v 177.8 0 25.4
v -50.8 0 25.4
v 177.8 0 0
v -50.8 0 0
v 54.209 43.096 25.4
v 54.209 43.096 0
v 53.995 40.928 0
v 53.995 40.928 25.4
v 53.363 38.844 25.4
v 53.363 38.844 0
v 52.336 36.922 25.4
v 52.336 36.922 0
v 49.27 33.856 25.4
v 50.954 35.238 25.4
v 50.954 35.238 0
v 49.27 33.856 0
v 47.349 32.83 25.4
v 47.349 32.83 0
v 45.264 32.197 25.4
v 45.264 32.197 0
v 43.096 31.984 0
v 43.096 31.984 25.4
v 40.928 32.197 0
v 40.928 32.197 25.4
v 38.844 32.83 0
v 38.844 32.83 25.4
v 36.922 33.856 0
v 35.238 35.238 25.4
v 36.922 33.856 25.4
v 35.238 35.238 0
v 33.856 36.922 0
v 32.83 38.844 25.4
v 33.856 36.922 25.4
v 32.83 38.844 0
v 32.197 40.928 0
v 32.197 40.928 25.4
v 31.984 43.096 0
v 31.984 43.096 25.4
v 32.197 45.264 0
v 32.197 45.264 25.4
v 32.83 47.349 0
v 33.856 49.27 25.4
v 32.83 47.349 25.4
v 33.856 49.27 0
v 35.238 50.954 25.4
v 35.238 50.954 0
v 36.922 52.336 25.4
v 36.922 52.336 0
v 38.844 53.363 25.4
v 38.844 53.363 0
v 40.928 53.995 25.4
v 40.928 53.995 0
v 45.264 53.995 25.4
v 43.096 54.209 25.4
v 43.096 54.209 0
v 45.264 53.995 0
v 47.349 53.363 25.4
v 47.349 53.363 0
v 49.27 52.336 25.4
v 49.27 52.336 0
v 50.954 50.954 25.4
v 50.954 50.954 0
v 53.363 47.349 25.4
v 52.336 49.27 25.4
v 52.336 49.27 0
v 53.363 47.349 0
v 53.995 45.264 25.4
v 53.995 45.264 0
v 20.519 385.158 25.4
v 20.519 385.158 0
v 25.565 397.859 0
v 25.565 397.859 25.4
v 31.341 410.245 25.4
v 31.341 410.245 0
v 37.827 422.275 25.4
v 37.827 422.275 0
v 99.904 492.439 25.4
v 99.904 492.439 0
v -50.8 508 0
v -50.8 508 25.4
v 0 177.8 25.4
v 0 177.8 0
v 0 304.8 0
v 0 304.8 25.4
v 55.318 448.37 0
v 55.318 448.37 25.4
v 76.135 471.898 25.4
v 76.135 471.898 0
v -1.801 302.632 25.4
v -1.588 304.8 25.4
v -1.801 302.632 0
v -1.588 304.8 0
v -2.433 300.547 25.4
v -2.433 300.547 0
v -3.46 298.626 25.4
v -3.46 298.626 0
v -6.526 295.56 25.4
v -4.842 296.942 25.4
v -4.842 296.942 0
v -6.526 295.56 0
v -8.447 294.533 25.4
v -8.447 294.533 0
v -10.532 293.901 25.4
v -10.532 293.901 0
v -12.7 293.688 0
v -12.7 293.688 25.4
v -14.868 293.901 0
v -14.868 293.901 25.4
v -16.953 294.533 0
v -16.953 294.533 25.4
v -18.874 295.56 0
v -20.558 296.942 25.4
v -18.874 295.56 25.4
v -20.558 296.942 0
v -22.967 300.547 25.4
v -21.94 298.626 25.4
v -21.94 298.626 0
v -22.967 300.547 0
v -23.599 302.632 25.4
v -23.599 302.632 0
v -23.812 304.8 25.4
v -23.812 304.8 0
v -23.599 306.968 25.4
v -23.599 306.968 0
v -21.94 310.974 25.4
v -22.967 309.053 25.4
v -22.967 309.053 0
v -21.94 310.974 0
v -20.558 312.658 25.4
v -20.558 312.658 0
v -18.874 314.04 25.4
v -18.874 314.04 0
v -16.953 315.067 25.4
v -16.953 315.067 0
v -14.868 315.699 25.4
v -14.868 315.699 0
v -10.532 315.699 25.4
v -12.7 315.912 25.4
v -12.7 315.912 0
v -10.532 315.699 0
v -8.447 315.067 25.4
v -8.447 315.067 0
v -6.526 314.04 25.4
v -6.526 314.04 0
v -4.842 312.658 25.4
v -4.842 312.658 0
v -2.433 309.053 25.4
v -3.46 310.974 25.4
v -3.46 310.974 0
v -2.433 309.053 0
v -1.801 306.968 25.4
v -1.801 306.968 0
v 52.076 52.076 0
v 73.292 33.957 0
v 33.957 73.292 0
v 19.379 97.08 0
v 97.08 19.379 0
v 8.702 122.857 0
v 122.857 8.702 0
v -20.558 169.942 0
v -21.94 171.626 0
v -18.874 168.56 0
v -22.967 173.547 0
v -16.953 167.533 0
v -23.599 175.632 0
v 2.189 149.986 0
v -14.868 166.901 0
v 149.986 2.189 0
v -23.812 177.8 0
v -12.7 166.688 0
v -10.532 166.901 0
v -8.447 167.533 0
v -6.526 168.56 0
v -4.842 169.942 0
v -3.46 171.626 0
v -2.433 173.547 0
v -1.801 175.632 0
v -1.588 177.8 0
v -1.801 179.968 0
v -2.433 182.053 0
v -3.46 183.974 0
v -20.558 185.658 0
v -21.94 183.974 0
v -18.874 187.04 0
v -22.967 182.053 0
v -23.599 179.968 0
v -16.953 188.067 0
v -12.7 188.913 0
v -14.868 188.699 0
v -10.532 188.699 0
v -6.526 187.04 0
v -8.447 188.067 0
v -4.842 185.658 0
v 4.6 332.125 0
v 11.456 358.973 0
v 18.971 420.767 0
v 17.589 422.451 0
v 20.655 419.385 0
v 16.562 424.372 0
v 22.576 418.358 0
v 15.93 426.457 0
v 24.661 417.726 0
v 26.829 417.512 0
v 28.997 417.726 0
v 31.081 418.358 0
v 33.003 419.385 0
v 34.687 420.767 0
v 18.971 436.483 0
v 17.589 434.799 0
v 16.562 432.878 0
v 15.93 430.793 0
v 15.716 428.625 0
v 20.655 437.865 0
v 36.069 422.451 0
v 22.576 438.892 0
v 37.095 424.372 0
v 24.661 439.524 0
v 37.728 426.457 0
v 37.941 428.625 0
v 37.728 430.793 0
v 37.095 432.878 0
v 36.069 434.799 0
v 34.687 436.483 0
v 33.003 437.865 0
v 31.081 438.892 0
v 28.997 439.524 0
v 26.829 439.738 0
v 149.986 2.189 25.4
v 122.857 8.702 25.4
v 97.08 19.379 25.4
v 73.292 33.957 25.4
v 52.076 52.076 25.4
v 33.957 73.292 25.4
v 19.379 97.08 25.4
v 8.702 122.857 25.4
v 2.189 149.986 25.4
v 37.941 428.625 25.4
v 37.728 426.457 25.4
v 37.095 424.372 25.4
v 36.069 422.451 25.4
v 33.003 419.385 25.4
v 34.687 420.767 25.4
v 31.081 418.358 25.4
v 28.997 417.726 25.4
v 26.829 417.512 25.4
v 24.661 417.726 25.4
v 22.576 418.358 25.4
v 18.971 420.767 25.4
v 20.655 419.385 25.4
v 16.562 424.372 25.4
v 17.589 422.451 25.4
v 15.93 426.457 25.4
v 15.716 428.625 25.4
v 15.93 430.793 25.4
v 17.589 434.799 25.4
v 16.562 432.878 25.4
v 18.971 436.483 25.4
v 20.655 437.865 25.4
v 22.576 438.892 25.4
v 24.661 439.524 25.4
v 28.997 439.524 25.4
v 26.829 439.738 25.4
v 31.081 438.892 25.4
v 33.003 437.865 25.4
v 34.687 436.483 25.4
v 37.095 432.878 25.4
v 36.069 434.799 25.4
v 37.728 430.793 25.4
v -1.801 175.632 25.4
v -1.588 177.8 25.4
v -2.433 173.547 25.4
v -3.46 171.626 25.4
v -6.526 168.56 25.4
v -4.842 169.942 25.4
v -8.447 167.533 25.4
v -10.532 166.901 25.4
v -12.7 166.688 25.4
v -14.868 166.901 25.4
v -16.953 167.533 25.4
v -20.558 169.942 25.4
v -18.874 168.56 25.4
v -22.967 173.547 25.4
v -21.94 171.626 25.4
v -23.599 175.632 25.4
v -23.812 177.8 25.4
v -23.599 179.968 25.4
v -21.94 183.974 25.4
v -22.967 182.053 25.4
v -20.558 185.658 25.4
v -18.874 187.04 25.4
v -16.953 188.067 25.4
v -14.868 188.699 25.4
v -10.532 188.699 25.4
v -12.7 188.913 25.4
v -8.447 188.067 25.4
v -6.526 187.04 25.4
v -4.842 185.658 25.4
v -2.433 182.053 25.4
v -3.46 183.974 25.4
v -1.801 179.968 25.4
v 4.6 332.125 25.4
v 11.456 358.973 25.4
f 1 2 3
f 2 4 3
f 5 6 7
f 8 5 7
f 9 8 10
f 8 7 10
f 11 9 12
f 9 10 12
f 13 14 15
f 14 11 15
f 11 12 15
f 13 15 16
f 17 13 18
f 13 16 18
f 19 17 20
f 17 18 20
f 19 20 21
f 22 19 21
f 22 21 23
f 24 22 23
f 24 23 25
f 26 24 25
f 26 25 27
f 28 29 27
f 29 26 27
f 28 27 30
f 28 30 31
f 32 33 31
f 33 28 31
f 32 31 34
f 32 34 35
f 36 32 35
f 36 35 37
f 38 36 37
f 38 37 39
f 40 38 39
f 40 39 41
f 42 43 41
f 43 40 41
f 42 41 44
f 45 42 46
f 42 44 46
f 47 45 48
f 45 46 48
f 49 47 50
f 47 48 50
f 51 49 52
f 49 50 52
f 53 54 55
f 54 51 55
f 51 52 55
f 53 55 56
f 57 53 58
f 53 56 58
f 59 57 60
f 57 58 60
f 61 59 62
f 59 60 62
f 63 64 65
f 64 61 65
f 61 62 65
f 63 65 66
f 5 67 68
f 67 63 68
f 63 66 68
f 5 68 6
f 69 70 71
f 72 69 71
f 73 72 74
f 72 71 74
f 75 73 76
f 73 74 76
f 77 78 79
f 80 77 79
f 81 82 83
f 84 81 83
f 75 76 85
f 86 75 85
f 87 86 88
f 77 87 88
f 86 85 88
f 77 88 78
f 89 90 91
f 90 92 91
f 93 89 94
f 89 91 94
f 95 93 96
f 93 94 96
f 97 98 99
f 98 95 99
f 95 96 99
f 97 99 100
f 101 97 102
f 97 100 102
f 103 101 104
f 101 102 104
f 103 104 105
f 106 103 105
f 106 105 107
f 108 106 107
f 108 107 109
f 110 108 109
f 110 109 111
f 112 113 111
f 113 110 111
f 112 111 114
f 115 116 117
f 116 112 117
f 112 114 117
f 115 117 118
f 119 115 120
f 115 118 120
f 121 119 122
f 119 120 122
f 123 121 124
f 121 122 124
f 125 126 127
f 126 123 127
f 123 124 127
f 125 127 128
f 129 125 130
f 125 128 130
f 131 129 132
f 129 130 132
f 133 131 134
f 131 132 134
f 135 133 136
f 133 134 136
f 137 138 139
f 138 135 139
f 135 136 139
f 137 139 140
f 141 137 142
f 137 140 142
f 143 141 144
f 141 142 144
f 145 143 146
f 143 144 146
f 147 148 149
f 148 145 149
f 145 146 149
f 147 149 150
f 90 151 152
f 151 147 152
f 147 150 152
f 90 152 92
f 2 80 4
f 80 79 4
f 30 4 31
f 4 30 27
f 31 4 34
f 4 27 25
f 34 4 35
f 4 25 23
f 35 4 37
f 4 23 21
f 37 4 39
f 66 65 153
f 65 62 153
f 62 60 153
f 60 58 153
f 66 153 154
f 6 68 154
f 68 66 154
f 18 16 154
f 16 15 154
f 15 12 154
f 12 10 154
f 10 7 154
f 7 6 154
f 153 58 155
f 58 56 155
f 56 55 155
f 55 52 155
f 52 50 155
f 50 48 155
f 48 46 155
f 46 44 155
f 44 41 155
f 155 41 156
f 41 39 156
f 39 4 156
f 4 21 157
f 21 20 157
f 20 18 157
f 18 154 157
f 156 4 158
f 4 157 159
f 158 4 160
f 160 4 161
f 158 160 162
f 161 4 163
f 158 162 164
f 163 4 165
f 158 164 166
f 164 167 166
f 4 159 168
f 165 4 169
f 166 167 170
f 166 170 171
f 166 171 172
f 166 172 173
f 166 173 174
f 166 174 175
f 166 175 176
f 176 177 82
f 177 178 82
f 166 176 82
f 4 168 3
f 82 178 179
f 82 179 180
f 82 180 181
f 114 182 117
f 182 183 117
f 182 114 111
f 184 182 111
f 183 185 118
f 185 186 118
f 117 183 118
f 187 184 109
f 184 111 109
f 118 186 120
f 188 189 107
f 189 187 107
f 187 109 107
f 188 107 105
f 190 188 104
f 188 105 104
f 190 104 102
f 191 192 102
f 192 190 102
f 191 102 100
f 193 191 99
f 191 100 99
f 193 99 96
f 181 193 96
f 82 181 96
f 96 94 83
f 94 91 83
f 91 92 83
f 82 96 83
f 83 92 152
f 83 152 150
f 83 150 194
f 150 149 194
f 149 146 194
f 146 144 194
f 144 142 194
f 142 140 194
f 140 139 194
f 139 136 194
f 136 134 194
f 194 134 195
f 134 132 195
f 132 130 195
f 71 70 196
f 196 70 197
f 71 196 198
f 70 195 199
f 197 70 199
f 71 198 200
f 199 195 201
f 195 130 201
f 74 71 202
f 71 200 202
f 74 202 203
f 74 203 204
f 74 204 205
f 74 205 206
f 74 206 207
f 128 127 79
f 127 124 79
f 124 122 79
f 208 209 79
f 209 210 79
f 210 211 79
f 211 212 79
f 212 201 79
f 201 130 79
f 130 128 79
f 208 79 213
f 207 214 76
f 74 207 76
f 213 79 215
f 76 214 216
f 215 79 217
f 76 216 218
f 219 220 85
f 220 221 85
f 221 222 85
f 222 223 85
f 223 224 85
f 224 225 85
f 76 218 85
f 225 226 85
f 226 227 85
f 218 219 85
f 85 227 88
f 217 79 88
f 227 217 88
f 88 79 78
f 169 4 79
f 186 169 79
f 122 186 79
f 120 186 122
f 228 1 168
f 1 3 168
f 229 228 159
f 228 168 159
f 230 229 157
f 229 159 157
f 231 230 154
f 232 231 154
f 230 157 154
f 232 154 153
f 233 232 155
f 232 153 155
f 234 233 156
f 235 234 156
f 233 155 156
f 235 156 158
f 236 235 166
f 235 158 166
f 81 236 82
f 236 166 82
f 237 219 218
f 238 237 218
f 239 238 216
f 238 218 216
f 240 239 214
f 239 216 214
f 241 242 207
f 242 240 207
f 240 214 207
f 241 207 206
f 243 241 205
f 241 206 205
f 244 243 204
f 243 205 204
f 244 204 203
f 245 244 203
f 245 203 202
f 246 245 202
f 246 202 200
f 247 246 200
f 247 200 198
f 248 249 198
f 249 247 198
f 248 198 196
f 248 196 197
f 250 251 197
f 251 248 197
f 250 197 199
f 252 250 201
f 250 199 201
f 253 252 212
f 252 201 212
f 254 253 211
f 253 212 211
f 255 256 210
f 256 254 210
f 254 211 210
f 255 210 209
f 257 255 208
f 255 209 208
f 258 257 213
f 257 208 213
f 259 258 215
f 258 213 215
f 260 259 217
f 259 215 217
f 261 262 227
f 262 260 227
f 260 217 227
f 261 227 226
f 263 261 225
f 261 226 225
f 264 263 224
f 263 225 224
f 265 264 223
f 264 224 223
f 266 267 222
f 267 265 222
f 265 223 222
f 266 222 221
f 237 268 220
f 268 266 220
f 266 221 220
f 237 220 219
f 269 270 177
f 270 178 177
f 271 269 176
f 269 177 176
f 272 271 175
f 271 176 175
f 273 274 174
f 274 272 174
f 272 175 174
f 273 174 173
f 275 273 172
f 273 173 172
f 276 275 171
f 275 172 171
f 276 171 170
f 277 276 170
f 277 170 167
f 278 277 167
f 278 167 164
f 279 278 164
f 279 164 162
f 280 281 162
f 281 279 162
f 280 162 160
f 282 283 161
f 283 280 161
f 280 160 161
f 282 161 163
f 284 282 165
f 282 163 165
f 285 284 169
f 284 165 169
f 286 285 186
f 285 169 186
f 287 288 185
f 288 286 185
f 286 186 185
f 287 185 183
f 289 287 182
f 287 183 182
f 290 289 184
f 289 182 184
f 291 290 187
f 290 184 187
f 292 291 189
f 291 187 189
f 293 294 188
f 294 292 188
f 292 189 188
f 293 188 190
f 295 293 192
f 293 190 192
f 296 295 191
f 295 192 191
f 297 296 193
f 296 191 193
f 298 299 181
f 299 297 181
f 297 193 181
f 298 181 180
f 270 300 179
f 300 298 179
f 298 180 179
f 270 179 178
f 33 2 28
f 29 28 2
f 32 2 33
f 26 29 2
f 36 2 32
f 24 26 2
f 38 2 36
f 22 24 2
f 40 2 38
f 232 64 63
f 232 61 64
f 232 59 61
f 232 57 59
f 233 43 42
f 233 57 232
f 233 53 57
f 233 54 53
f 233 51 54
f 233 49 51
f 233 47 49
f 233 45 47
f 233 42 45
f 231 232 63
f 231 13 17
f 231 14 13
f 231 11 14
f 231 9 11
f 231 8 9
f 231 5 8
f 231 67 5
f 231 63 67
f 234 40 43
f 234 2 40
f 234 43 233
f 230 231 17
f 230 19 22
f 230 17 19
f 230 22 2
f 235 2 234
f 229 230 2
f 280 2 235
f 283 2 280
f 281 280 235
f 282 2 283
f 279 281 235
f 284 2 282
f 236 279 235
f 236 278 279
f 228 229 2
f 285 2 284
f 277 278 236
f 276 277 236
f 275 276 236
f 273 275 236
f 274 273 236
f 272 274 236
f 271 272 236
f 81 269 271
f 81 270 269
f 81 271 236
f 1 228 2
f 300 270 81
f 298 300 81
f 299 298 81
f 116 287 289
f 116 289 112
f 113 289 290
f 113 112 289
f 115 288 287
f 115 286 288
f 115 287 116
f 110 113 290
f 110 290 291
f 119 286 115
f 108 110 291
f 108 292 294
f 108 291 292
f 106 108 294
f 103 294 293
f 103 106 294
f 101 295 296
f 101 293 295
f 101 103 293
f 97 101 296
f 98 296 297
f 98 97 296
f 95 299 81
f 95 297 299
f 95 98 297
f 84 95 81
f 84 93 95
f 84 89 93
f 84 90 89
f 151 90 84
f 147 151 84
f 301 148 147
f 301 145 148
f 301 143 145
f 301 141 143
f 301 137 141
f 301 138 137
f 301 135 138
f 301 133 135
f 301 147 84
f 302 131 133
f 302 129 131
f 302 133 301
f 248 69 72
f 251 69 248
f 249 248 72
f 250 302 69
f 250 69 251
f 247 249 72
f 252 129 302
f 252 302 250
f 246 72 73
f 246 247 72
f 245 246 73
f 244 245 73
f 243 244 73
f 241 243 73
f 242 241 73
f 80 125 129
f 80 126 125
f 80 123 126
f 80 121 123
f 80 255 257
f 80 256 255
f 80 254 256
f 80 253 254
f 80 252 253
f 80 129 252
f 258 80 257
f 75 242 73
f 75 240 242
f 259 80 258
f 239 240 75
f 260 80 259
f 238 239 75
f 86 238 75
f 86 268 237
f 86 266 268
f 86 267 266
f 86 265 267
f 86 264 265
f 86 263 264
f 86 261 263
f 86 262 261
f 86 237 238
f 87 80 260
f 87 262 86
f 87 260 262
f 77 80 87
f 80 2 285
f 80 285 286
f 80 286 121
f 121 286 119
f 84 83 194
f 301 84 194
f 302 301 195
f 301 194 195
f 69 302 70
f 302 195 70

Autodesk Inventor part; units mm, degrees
ref_plane "YZ Plane" through (0, 0, 0) normal (1, 0, 0) x (0, 1, 0)
ref_plane "XZ Plane" through (0, 0, 0) normal (0, 1, 0) x (-1, 0, 0)
ref_plane "XY Plane" through (0, 0, 0) normal (0, 0, 1) x (1, 0, 0)
sketch "Sketch1" plane through (0, 0, 0) normal (0, 0, 1) x (1, 0, 0)
  line L0 (0, 0) -> (609.6, 0) construction
  line L1 (609.6, 0) -> (609.6, 209.55)
  line L2 (609.6, 209.55) -> (0, 209.55) construction
  line L3 (0, 209.55) -> (0, 0) construction
  line L4 (0, 0) -> (304.8, 0) construction
  line L5 (304.8, 0) -> (304.8, 165.1) construction
  line L6 (304.8, 165.1) -> (0, 165.1) construction
  line L7 (0, 165.1) -> (0, 0) construction
  line L8 (0, 0) -> (165.1, 0) construction
  line L9 (165.1, 0) -> (165.1, 304.8) construction
  line L10 (165.1, 304.8) -> (0, 304.8) construction
  line L11 (0, 304.8) -> (0, 0) construction
  line L12 (0, 0) -> (177.8, 0) construction
  line L13 (177.8, 0) -> (177.8, 177.8) construction
  line L14 (177.8, 177.8) -> (0, 177.8) construction
  line L15 (0, 177.8) -> (0, 0) construction
  circle A0 centre (177.8, 177.8) radius 12.7
  line L16 (177.8, 177.8) -> (165.1, 177.8)
  line L17 (177.8, 177.8) -> (177.8, 165.1)
  line L18 (177.8, 177.8) -> (168.819744, 168.819744)
  line L19 (177.8, 177.8) -> (190.5, 177.8) construction
  line L20 (168.819744, 168.819744) -> (52.076414, 52.076414) construction
  line L21 (168.819744, 168.819744) -> (333.919744, 168.819744) construction
  line L22 (177.8, 165.1) -> (177.8, 0) construction
  line L23 (165.1, 177.8) -> (0, 177.8) construction
  arc A1 (0, 177.8) -> (177.8, 0) centre (177.8, 177.8) ccw
  line L24 (177.8, 177.8) -> (304.8, 177.8) construction
  line L25 (304.8, 177.8) -> (304.8, 193.675)
  line L26 (304.8, 193.675) -> (177.8, 193.675) construction
  line L27 (177.8, 193.675) -> (177.8, 177.8) construction
  circle A2 centre (304.8, 193.675) radius 12.7
  line L28 (304.8, 193.675) -> (431.8, 193.675) construction
  line L29 (431.8, 193.675) -> (431.8, 209.55) construction
  line L30 (431.8, 209.55) -> (304.8, 209.55) construction
  line L31 (304.8, 209.55) -> (304.8, 193.675) construction
  circle A3 centre (431.8, 209.55) radius 12.7
  line L32 (177.8, 0) -> (609.6, 0)
  line L33 (177.8, 165.1) -> (304.8, 180.975)
  line L34 (431.8, 196.85) -> (304.8, 180.975)
  line L35 (431.8, 196.85) -> (609.6, 209.55)
  line L36 (165.1, 177.8) -> (165.1, 304.8) construction
  line L37 (165.1, 304.8) -> (241.3, 304.8) construction
  circle A4 centre (241.3, 304.8) radius 76.2
  circle A5 centre (177.8, 228.6) radius 12.7
  line L38 (177.8, 177.8) -> (177.8, 228.6)
  line L39 (0, 177.8) -> (0, 304.8)
  line L40 (241.3, 304.8) -> (195.441695, 365.656026) construction
  line L41 (241.3, 304.8) -> (317.5, 304.8) construction
  line L42 (195.441695, 365.656026) -> (354.191695, 365.656026) construction
  line L43 (195.441695, 365.656026) -> (99.90356, 492.439413) construction
  line L44 (195.441695, 365.656026) -> (354.191695, 365.656026) construction
  line L45 (165.1, 304.8) -> (0, 304.8) construction
  line L46 (241.3, 304.8) -> (169.695422, 330.861935) construction
  line L47 (241.3, 304.8) -> (317.5, 304.8) construction
  line L48 (169.695422, 330.861935) -> (20.519219, 385.157633) construction
  line L49 (177.8, 0) -> (408.09644, 0) construction
  line L50 (241.3, 304.8) -> (317.5, 304.8) construction
  line L51 (241.3, 304.8) -> (175.308864, 342.9) construction
  line L52 (241.3, 304.8) -> (317.5, 304.8) construction
  line L53 (175.308864, 342.9) -> (37.827331, 422.275) construction
  arc A6 (99.90356, 492.439413) -> (20.519219, 385.157633) centre (241.3, 304.8) ccw
  arc A7 (37.827331, 422.275) -> (0, 304.8) centre (330.4977, 263.206429) ccw
  line L54 (37.827331, 422.275) -> (26.828809, 428.625) construction
  circle A8 centre (26.828809, 428.625) radius 12.7
  line L55 (0, 304.8) -> (-12.7, 304.8) construction
  circle A9 centre (-12.7, 304.8) radius 12.7
  line L56 (0, 177.8) -> (-12.7, 177.8) construction
  circle A10 centre (-12.7, 177.8) radius 12.7
  line L57 (52.076414, 52.076414) -> (43.096158, 43.096158) construction
  circle A11 centre (43.096158, 43.096158) radius 12.7
  line L58 (0, 177.8) -> (0, 304.8)
  circle A12 centre (43.096158, 43.096158) radius 11.1125
  circle A13 centre (-12.7, 304.8) radius 11.1125
  circle A14 centre (-12.7, 177.8) radius 11.1125
  circle A15 centre (26.828809, 428.625) radius 11.1125
  line L59 (190.5, 177.8) -> (393.7, 177.8) construction
  line L60 (609.6, 0) -> (-50.8, 0)
  line L61 (-50.8, 0) -> (-50.8, 508)
  line L62 (-50.8, 508) -> (99.90356, 492.439413)
  line L63 (177.8, 0) -> (-50.8, 0)
  point P0 (165.275068, 230.701449)
  point P1 (172.715134, 216.962383)
  dimension "d16" = 25.4
  dimension "d19" = 25.4
  dimension "d0" = 609.6
  dimension "d1" = 209.55
  dimension "d2" = 304.8
  dimension "d3" = 165.1
  dimension "d4" = 165.1
  dimension "d5" = 304.8
  dimension "d6" = 177.8
  dimension "d7" = 177.8
  dimension "d8" = 25.4
  dimension "d9" = 12.7
  dimension "d10" = 135
  dimension "d11" = 165.1
  dimension "d12" = 135
  dimension "d13" = 165.1
  dimension "d14" = 127
  dimension "d15" = 15.875
  dimension "d17" = 127
  dimension "d18" = 15.875
  dimension "d20" = 127
  dimension "d21" = 76.2
  dimension "d22" = 152.4
  dimension "d23" = 25.4
  dimension "d24" = 50.8
  dimension "d25" = 127
  dimension "d26" = 127
  dimension "d33" = 158.75
  dimension "d34" = 127
  dimension "d35" = 160
  dimension "d36" = 158.75
  dimension "d37" = 180
  dimension "d45" = 150
  dimension "d46" = 158.75
  dimension "d47" = 180
  dimension "d48" = 12.7
  dimension "d49" = 12.7
  dimension "d50" = 12.7
  dimension "d52" = 12.7
  dimension "d53" = 25.4
  dimension "d55" = 214.47119
  dimension "d56" = 22.225
  dimension "d57" = 22.225
  dimension "d58" = 22.225
  dimension "d59" = 22.225
  dimension "d60" = 134.70384
  dimension "d72" = 660.4
  dimension "d73" = 508
  dimension "d74" = 90
sketch "Sketch1 outline for Extrusion2" plane through (0, 0, 0) normal (0, 0, 1) x (1, 0, 0)
  line L0 (-50.8, 508) -> (-50.8, 0)
  line L1 (99.90356, 492.439413) -> (-50.8, 508)
  line L2 (-50.8, 0) -> (177.8, 0)
  arc A0 (37.827331, 422.275) -> (99.90356, 492.439413) centre (241.3, 304.8) cw
  arc A1 (177.8, 0) -> (0, 177.8) centre (177.8, 177.8) cw
  arc A2 (20.519219, 385.157633) -> (37.827331, 422.275) centre (241.3, 304.8) cw
  line L3 (0, 177.8) -> (0, 304.8)
  arc A3 (0, 304.8) -> (20.519219, 385.157633) centre (330.4977, 263.206429) cw
  circle A4 centre (-12.7, 177.8) radius 11.1125
  circle A5 centre (43.096158, 43.096158) radius 11.1125
  circle A6 centre (-12.7, 304.8) radius 11.1125
  circle A7 centre (26.828809, 428.625) radius 11.1125
extrude "Extrusion2" add sketch "Sketch1 outline for Extrusion2" along normal blind 25.4
